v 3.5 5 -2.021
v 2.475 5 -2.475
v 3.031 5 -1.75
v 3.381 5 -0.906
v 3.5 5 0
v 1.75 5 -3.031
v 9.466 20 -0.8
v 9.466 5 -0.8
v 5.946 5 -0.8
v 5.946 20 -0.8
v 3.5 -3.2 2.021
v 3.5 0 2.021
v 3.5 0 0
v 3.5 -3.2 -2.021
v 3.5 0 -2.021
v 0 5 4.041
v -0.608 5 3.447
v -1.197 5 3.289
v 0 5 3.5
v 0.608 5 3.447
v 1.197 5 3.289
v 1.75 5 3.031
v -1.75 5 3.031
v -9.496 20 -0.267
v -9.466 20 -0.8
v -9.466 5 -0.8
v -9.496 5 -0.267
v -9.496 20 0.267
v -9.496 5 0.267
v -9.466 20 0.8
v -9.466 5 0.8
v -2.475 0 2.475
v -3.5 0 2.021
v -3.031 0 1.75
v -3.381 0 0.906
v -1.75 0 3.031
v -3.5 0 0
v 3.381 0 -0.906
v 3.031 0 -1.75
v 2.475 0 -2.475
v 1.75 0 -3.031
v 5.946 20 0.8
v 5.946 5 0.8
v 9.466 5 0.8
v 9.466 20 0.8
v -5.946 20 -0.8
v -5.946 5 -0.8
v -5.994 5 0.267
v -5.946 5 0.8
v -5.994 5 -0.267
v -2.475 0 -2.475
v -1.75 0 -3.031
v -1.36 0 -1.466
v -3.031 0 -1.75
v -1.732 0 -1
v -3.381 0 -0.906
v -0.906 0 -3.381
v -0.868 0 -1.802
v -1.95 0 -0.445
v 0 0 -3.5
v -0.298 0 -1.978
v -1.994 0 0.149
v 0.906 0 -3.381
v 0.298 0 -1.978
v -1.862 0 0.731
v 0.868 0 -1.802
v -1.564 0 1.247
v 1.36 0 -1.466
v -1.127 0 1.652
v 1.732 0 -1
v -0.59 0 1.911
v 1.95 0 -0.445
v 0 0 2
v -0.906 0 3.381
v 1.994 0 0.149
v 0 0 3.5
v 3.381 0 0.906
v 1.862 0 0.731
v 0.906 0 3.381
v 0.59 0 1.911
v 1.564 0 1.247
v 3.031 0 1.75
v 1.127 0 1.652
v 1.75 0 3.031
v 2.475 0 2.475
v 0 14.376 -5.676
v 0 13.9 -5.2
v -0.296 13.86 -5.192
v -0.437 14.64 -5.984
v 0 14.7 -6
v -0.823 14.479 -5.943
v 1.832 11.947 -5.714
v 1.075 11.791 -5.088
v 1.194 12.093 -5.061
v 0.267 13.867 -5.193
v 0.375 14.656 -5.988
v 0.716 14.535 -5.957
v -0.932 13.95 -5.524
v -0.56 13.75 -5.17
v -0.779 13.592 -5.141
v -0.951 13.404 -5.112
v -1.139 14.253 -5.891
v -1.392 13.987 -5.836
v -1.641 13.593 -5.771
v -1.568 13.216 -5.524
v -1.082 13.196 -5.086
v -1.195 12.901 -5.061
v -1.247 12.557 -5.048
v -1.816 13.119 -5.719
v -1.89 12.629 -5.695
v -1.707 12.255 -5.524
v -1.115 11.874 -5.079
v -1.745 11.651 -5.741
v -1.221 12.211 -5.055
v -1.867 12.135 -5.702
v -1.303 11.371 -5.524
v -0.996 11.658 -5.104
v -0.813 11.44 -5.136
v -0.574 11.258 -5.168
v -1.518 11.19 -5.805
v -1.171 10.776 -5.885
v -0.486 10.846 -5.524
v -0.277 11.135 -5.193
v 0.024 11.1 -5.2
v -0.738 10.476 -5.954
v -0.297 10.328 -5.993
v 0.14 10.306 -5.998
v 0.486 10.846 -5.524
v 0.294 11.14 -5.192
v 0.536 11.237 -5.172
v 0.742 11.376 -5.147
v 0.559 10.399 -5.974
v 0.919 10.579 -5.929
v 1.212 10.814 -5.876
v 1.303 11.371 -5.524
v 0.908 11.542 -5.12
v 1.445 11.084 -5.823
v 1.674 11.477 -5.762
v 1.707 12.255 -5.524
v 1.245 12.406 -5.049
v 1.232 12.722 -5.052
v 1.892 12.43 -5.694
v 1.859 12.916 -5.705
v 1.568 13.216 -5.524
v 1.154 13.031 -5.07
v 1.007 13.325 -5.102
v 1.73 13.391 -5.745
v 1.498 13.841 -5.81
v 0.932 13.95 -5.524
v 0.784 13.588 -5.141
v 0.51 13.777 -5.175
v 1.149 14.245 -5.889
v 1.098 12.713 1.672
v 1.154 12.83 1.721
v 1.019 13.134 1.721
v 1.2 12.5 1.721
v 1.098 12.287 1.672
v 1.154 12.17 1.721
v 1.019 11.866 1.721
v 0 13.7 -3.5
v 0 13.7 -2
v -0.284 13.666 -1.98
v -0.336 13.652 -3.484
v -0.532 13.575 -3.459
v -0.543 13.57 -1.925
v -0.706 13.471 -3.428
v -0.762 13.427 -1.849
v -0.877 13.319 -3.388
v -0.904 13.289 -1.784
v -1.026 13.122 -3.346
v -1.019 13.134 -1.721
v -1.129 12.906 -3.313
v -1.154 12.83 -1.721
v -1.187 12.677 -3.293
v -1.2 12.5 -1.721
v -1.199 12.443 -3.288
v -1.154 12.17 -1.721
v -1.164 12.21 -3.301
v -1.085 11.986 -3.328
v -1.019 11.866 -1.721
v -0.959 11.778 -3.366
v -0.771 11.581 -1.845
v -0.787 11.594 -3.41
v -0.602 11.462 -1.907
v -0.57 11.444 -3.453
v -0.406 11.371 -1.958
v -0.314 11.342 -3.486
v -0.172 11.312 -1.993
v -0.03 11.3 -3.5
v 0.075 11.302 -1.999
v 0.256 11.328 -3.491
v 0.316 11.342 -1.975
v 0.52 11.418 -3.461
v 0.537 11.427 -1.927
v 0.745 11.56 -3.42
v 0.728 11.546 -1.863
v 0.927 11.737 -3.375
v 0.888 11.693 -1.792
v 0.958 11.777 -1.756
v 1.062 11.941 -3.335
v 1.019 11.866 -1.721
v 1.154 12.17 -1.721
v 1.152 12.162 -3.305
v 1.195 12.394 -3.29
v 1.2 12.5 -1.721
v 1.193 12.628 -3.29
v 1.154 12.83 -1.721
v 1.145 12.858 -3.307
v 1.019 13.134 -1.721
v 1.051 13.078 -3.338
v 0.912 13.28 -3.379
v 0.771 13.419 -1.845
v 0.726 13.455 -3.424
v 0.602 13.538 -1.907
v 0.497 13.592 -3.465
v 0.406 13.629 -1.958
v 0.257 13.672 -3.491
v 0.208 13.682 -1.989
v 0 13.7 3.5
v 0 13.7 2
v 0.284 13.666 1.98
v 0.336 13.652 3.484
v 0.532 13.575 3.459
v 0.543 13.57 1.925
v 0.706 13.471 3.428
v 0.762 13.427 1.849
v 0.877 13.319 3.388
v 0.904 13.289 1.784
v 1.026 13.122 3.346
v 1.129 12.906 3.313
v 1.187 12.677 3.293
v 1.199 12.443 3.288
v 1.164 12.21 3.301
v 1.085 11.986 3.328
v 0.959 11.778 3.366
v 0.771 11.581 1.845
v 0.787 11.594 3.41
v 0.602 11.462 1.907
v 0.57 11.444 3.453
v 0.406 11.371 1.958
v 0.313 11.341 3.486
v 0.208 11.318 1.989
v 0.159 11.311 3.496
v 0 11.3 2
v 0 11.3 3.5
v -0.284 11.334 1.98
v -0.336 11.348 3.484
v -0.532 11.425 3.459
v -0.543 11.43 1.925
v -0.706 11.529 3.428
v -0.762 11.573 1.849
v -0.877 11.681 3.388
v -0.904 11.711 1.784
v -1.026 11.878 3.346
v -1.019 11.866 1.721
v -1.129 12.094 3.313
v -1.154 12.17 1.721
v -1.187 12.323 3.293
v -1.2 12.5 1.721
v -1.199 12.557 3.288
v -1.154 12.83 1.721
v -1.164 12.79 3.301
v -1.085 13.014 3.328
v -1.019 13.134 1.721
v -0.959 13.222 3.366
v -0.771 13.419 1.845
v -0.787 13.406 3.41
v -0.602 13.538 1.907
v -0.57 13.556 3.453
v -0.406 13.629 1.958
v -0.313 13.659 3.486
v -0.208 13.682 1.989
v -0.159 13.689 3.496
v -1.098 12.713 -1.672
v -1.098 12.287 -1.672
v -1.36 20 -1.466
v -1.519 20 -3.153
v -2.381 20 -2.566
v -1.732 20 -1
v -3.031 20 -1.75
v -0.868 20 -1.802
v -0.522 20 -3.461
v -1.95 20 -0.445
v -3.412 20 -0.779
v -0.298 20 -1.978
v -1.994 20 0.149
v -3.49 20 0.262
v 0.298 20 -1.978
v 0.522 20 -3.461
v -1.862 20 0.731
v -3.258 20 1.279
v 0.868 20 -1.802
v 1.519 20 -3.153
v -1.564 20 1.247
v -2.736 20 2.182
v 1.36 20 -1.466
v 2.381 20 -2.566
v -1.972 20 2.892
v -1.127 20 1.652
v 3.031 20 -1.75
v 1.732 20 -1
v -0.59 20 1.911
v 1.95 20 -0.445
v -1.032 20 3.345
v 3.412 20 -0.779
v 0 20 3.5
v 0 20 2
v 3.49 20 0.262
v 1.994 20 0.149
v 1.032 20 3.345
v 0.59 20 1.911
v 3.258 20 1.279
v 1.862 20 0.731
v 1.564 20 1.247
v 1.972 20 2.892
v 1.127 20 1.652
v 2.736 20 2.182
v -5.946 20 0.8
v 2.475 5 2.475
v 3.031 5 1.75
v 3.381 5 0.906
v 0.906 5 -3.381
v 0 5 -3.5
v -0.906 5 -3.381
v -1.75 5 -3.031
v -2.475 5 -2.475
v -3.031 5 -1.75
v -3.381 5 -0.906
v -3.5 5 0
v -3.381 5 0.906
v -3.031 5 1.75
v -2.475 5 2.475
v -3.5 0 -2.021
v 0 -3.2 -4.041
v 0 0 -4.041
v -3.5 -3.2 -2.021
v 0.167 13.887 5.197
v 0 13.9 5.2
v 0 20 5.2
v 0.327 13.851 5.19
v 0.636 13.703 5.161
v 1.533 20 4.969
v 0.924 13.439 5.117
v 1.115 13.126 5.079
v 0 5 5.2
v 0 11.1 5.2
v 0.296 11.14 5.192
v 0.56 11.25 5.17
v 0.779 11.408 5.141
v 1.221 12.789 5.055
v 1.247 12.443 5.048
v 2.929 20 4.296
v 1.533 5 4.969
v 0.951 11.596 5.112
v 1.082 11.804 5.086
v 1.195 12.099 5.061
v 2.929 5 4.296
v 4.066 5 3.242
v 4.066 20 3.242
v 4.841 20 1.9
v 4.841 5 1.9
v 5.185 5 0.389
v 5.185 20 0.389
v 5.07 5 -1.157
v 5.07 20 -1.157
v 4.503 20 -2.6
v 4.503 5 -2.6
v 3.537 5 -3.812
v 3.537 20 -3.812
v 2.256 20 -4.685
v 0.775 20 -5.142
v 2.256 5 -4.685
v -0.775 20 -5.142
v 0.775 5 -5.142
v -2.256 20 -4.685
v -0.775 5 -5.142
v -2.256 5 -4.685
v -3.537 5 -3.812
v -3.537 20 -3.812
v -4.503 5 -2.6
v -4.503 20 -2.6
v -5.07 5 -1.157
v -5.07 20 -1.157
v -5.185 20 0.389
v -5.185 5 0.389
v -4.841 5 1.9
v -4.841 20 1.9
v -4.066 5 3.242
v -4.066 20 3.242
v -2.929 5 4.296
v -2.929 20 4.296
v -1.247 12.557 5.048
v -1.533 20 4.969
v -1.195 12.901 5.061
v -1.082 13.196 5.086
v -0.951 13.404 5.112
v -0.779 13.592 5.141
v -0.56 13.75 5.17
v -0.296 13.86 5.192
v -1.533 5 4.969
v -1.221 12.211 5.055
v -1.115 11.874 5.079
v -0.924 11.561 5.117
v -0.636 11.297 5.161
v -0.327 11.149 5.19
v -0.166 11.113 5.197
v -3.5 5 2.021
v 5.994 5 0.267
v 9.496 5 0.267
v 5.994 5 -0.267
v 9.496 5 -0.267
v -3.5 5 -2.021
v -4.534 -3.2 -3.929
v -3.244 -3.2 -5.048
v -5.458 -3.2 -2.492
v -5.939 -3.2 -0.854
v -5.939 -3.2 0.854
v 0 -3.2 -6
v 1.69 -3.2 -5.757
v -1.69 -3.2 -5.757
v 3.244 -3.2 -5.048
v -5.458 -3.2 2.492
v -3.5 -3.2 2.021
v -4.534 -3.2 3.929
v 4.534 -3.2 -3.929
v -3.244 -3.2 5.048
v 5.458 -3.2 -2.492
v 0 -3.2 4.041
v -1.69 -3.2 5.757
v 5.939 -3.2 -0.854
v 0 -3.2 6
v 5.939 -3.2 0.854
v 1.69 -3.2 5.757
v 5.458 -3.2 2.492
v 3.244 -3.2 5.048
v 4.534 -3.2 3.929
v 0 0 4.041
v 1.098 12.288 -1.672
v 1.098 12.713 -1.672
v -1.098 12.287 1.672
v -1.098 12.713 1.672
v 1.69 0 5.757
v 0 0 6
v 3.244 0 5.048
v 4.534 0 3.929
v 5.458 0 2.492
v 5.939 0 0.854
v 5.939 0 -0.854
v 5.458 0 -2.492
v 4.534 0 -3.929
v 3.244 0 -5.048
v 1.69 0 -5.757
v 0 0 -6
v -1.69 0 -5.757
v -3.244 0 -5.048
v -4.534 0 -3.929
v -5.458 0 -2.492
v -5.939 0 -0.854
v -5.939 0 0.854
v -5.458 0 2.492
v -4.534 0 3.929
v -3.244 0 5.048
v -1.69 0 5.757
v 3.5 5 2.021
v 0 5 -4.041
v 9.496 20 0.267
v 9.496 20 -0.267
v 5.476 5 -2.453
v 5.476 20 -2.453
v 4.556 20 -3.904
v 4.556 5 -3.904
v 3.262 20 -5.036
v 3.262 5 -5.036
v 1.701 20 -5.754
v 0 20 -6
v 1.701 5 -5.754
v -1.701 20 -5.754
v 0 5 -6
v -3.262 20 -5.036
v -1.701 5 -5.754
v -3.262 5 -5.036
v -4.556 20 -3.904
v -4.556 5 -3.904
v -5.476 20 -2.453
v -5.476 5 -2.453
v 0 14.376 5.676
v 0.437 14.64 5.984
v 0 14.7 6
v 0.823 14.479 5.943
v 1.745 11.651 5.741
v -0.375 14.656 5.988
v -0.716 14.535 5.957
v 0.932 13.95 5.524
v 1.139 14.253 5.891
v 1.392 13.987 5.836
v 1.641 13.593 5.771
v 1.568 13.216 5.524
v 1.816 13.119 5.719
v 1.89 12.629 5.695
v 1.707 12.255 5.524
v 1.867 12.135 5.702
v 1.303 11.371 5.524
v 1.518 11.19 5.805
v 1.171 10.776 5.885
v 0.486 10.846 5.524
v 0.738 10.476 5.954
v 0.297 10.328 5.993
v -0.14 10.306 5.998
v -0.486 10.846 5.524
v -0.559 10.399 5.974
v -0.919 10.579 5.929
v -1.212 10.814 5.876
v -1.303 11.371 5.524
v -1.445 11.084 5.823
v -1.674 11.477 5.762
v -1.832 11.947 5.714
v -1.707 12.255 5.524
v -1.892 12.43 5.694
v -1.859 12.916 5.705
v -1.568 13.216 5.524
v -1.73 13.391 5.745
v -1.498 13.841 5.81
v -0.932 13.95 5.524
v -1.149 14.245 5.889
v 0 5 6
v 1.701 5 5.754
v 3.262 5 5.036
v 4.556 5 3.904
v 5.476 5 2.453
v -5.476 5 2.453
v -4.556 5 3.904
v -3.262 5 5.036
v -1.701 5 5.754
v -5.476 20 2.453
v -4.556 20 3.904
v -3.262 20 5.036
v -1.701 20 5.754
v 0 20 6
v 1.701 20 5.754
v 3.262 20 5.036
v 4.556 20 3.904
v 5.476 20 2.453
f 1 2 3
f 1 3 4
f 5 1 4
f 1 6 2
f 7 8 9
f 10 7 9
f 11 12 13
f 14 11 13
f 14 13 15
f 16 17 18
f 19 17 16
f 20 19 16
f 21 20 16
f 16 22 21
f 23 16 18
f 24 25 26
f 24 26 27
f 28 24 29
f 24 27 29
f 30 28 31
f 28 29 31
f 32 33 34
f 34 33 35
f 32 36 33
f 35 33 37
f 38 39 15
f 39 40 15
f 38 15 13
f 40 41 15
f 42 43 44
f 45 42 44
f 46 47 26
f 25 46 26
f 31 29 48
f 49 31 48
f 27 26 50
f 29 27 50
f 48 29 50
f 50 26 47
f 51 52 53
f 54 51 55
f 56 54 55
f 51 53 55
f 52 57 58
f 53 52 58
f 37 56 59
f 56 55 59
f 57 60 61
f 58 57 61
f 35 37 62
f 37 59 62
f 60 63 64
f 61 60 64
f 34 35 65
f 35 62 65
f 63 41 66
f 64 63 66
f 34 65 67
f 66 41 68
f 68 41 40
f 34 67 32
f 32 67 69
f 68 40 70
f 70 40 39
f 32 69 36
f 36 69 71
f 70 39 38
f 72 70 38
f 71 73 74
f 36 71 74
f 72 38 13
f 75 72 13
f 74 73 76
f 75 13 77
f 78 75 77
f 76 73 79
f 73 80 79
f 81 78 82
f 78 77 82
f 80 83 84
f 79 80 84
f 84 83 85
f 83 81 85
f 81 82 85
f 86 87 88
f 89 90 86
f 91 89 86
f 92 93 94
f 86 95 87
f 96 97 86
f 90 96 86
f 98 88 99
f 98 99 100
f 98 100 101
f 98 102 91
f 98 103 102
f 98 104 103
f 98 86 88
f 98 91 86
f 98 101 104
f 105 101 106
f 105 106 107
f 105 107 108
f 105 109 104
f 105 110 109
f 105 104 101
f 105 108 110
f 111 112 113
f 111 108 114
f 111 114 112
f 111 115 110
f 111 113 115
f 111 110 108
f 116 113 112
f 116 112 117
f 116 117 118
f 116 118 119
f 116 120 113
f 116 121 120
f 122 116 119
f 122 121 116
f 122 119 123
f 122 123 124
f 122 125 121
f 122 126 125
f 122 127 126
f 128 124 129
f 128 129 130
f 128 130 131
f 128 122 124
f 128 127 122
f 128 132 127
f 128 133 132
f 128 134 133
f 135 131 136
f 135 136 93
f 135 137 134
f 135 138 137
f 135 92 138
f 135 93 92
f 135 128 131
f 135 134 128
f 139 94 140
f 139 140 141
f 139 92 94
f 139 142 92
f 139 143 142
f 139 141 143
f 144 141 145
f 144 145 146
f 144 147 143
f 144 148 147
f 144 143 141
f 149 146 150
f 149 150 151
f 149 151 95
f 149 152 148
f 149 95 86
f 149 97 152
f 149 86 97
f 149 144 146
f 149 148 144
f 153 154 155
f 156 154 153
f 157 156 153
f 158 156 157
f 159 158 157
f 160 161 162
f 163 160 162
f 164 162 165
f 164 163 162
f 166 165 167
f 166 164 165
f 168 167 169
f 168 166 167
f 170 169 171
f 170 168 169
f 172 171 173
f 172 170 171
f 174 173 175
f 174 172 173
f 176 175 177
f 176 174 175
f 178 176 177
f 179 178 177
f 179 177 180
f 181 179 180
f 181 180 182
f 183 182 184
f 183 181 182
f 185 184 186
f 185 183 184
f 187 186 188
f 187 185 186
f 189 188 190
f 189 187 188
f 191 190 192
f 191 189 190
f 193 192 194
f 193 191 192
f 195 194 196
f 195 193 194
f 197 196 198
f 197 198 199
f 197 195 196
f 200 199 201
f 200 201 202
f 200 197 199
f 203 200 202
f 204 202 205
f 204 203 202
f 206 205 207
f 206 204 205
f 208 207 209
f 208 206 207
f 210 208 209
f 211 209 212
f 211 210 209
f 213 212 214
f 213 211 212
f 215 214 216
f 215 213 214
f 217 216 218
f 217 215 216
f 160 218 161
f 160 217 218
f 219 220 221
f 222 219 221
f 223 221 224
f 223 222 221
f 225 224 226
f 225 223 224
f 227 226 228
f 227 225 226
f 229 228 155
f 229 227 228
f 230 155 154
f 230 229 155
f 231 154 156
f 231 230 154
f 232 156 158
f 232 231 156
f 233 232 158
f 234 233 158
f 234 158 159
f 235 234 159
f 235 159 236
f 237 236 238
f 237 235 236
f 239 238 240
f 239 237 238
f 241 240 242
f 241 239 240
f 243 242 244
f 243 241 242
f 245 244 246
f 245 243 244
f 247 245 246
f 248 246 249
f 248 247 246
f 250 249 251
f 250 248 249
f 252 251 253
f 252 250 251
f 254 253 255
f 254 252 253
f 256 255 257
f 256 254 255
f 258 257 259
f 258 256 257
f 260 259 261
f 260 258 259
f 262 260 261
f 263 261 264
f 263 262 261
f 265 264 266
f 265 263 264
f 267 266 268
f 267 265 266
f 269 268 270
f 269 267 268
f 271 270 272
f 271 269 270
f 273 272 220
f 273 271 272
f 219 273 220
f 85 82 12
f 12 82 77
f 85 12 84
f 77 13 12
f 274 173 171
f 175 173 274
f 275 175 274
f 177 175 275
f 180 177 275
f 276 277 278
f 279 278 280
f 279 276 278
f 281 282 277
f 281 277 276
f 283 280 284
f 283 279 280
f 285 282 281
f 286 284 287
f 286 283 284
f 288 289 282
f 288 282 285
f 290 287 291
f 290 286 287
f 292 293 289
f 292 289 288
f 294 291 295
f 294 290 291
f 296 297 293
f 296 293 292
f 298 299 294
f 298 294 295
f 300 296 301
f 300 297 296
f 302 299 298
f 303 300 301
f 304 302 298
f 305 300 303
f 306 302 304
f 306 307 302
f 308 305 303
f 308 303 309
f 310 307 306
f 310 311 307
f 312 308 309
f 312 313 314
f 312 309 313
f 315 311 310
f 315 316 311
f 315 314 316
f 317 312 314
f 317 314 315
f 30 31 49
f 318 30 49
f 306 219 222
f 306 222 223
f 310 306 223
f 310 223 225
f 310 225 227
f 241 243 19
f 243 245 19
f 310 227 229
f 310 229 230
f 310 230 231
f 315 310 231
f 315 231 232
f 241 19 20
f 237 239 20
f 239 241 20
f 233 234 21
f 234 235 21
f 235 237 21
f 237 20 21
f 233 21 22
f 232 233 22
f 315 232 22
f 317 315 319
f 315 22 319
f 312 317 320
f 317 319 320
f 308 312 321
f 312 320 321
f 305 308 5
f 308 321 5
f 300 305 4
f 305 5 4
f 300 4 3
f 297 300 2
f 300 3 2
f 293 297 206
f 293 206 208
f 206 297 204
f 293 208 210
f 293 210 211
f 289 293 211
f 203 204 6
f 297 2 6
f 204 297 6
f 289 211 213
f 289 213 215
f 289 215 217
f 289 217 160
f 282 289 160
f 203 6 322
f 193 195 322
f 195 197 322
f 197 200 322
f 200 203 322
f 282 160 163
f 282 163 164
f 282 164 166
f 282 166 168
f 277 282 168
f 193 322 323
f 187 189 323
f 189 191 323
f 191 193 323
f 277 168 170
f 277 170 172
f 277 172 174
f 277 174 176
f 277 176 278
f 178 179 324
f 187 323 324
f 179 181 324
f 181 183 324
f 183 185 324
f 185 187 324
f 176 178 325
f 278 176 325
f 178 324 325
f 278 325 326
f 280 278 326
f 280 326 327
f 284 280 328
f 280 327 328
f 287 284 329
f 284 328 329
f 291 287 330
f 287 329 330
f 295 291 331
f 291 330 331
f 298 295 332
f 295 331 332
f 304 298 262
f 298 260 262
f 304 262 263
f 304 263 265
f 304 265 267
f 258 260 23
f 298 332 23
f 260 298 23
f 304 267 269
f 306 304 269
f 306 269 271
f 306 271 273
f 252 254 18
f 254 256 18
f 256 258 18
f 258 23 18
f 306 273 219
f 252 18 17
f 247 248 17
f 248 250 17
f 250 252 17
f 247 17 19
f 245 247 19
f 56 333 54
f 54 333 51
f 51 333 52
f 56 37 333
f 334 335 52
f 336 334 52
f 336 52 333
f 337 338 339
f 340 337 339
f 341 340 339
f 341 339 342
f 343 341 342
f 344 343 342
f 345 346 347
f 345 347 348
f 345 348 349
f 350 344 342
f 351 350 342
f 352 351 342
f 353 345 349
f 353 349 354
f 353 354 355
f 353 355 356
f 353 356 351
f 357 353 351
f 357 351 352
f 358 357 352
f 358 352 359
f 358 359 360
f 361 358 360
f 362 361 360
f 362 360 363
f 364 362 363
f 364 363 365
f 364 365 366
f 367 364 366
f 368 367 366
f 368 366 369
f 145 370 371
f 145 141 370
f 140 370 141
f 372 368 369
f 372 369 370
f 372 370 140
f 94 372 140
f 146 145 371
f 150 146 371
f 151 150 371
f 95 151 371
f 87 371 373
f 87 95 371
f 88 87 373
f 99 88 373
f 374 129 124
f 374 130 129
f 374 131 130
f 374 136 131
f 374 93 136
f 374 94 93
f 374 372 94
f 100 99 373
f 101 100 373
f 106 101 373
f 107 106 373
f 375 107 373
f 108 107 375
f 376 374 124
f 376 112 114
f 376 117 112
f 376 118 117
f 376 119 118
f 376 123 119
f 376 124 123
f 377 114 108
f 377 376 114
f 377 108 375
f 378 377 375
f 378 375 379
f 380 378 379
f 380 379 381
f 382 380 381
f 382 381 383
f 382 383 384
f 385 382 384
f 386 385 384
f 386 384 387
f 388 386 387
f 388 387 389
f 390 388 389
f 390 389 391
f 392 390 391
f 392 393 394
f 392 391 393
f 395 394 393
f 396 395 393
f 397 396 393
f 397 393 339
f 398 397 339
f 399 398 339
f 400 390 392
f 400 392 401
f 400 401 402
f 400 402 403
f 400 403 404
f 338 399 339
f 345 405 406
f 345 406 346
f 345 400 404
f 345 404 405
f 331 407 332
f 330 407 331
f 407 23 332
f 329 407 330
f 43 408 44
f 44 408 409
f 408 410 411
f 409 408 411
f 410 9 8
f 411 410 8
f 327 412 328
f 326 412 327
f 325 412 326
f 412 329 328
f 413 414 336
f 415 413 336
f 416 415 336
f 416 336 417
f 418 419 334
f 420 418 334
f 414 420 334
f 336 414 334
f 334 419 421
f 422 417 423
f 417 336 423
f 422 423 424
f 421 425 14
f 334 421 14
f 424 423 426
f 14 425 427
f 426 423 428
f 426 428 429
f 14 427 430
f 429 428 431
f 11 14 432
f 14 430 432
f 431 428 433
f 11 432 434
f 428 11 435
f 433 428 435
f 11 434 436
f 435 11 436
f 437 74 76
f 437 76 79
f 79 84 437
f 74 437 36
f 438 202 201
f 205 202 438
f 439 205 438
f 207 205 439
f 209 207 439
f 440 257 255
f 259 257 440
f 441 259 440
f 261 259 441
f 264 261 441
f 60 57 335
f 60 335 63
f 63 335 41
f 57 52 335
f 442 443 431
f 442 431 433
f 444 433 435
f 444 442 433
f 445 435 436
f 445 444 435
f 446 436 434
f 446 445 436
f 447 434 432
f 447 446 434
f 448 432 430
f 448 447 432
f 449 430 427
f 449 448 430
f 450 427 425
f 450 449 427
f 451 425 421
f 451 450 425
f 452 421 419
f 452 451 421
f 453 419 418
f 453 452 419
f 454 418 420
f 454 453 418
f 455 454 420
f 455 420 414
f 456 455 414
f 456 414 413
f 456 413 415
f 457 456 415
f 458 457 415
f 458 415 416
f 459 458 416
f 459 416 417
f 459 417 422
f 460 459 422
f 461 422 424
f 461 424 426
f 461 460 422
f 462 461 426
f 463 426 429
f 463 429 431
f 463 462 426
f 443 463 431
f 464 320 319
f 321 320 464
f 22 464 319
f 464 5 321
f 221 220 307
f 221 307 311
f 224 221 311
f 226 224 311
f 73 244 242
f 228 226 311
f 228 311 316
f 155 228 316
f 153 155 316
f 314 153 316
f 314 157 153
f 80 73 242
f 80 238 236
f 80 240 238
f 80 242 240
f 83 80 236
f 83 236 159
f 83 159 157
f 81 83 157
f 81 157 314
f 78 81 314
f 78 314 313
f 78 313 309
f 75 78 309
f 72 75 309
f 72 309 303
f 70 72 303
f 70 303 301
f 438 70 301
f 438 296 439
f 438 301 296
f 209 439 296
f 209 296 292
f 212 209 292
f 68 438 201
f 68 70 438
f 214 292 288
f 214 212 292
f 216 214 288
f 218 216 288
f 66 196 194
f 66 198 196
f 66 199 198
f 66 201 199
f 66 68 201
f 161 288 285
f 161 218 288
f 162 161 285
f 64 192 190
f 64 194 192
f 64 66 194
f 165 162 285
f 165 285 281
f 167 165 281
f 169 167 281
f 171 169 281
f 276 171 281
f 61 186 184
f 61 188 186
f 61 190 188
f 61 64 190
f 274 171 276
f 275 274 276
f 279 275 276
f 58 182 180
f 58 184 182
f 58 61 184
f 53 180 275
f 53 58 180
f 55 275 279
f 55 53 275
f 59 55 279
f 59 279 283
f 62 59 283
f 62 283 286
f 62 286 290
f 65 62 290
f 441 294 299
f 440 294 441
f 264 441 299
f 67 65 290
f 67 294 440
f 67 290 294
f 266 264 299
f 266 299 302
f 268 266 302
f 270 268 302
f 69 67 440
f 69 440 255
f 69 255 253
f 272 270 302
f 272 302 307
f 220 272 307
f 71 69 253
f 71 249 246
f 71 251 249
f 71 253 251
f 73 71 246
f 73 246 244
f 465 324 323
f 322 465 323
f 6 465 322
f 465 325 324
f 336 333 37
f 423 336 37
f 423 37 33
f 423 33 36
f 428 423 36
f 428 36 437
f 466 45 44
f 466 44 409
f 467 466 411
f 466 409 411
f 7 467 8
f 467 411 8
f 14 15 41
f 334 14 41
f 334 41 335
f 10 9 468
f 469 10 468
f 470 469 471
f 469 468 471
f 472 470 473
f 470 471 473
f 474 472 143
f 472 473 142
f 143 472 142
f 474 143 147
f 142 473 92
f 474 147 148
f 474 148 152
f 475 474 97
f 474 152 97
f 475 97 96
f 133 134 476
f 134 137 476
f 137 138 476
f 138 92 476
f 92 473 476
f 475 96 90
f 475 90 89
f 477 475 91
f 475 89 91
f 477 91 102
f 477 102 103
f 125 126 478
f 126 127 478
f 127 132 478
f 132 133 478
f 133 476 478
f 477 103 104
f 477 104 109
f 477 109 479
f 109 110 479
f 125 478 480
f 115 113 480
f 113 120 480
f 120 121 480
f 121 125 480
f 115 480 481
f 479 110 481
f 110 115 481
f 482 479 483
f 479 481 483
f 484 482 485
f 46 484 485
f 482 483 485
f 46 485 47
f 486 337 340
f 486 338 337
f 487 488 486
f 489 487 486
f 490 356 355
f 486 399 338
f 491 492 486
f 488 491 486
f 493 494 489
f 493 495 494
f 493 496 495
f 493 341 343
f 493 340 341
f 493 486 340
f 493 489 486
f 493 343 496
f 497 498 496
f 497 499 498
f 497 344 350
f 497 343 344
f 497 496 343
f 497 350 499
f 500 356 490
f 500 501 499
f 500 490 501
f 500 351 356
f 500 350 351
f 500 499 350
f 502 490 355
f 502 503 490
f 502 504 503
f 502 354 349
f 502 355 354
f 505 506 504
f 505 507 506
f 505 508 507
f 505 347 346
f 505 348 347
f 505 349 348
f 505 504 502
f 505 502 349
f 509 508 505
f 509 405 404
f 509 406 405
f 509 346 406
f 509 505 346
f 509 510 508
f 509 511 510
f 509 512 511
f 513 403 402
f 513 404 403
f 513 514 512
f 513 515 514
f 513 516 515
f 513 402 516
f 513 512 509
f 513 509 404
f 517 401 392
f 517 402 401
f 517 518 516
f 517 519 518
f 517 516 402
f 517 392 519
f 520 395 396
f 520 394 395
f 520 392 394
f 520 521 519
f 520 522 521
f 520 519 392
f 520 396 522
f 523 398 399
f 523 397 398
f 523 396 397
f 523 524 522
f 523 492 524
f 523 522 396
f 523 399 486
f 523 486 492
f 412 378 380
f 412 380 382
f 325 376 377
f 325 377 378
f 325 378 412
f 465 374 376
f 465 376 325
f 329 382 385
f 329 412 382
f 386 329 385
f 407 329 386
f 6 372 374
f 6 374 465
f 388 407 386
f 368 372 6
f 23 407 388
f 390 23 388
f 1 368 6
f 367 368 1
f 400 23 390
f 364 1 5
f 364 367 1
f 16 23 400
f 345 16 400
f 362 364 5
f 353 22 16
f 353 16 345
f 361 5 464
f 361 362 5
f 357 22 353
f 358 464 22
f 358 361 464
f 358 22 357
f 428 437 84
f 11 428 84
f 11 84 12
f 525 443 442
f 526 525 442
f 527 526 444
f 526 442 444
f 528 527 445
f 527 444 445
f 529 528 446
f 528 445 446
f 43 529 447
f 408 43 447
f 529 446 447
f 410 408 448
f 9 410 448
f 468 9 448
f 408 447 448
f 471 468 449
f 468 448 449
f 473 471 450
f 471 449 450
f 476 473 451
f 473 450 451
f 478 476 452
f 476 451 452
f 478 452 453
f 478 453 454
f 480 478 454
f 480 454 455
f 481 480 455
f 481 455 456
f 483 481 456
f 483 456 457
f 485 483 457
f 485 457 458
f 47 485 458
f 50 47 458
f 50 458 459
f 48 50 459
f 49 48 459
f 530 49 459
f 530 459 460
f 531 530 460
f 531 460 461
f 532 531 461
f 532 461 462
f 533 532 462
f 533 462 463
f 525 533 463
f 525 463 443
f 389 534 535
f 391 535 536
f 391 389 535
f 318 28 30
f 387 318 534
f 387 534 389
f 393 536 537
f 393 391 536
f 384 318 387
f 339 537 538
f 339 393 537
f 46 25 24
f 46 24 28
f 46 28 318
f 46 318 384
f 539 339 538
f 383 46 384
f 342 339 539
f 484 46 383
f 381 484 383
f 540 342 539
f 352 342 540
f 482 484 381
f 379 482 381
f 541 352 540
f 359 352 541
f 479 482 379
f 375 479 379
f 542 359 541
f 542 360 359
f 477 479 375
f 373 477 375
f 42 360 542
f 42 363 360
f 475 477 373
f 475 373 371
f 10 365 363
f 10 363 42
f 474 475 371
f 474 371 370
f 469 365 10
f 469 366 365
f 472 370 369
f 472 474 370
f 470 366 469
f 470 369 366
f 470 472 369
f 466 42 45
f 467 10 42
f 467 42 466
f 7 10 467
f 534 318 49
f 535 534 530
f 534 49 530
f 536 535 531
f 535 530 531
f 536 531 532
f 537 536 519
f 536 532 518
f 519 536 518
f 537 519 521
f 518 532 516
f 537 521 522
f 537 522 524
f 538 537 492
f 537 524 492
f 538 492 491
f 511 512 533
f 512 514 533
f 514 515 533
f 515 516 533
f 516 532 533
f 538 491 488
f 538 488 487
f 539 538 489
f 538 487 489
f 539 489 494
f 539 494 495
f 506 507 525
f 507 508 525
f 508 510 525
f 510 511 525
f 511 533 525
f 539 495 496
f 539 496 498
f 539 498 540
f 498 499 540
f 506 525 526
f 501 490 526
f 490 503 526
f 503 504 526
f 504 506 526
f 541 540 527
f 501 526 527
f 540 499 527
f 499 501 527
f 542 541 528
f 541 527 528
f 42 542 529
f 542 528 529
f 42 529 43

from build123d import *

# Parameters (mm, degrees)
SKETCH1_R           = 2
BOSS_EXTRUDE1_DEPTH = 20
SKETCH1_3_R         = 6
BOSS_EXTRUDE2_DEPTH = 3.2
SKETCH1_4_R         = 6
SKETCH1_4_R_2       = 3.5
BOSS_EXTRUDE3_DEPTH = 5
SKETCH2_R           = 5.2
BOSS_EXTRUDE4_DEPTH = 15
CIRPATTERN1_COUNT   = 2


with BuildPart() as part:
    # Sketch1 → Boss-Extrude1 (new body)
    with BuildSketch(Plane(origin=(0, 0, 0), x_dir=(1, 0, 0), z_dir=(0, 1, 0))):
        with BuildLine():
            ThreePointArc((1.750000074, -3.03108887), (3.031088935, -1.749999963), (3.5, 0))
            ThreePointArc((3.5, 0), (3.03108893, 1.749999971), (1.750000057, 3.03108888))
            ThreePointArc((1.750000057, 3.03108888), (8.8e-08, 3.5), (-1.749999906, 3.031088968))
            ThreePointArc((-1.749999906, 3.031088968), (-3.031088886, 1.750000047), (-3.5, 0))
            ThreePointArc((-3.5, 0), (-3.031088909, -1.750000007), (-1.749999986, -3.031088921))
            ThreePointArc((-1.749999986, -3.031088921), (5.1e-08, -3.5), (1.750000074, -3.03108887))
        make_face()
        Circle(SKETCH1_R, mode=Mode.SUBTRACT)
    extrude(amount=BOSS_EXTRUDE1_DEPTH)



with BuildPart() as body_2:
    # Sketch1<3> → Boss-Extrude2 (new body)
    with BuildSketch(Plane(origin=(0, 0, 0), x_dir=(1, 0, 0), z_dir=(0, 1, 0))):
        Circle(SKETCH1_3_R)
        Polygon((3.5, 0), (3.5, -2.020725942), (1.750000074, -3.03108887), (0, -4.041451884), (-1.749999986, -3.031088921), (-3.5, -2.020725942), (-3.5, 0), (-3.5, 2.020725942), (-1.749999906, 3.031088968), (0, 4.041451884), (1.750000057, 3.03108888), (3.5, 2.020725942), align=None, mode=Mode.SUBTRACT)
    extrude(amount=-BOSS_EXTRUDE2_DEPTH)


with BuildPart() as part_1:
    add(part.part)

    add(body_2.part)  # Boss-Extrude3 merges body 2
    # Sketch1<4> → Boss-Extrude3 (add)
    with BuildSketch(Plane(origin=(0, 0, 0), x_dir=(1, 0, 0), z_dir=(0, 1, 0))):
        Circle(SKETCH1_4_R)
        Circle(SKETCH1_4_R_2, mode=Mode.SUBTRACT)
    extrude(amount=BOSS_EXTRUDE3_DEPTH)

    # Sketch2 → Boss-Extrude4 (add)
    with BuildSketch(Plane(origin=(0, 5, 0), x_dir=(1, 0, 0), z_dir=(0, 1, 0))):
        with BuildLine():
            Line((-9.46625586, -0.8), (-5.946427499, -0.8))
            ThreePointArc((-5.946427499, -0.8), (0, -6), (5.946427499, -0.8))
            Line((5.946427499, -0.8), (9.46625586, -0.8))
            ThreePointArc((9.46625586, -0.8), (9.5, 0), (9.46625586, 0.8))
            Line((9.46625586, 0.8), (5.946427499, 0.8))
            ThreePointArc((5.946427499, 0.8), (0, 6), (-5.946427499, 0.8))
            Line((-5.946427499, 0.8), (-9.46625586, 0.8))
            ThreePointArc((-9.46625586, 0.8), (-9.5, 0), (-9.46625586, -0.8))
        make_face()
        Circle(SKETCH2_R, mode=Mode.SUBTRACT)
    extrude(amount=BOSS_EXTRUDE4_DEPTH)

    # Sketch5 → CSK for M2 Flat Head Machine Screw1 (revolve, cut)
    with BuildSketch(Plane(origin=(0, 12.5, -6), x_dir=(0, 1, 0), z_dir=(1, 0, 0))):
        Polygon((0, 0), (0, 5), (1.2, 4.278967257), (1.2, 1), (2.2, 0), align=None)
    csk_for_m2_flat_head_machine_screw1 = revolve(axis=Axis((0, 12.5, -12.35), (0, 0, 1)), mode=Mode.SUBTRACT)

    # CirPattern1: CSK for M2 Flat Head Machine Screw1 ×2 about axis
    cirpattern1_axis = Axis((0, 5, 0), (0, -1, 0))
    for i in range(1, CIRPATTERN1_COUNT):
        add(csk_for_m2_flat_head_machine_screw1.rotate(cirpattern1_axis, i * 360 / CIRPATTERN1_COUNT), mode=Mode.SUBTRACT)


solid = part_1.part
